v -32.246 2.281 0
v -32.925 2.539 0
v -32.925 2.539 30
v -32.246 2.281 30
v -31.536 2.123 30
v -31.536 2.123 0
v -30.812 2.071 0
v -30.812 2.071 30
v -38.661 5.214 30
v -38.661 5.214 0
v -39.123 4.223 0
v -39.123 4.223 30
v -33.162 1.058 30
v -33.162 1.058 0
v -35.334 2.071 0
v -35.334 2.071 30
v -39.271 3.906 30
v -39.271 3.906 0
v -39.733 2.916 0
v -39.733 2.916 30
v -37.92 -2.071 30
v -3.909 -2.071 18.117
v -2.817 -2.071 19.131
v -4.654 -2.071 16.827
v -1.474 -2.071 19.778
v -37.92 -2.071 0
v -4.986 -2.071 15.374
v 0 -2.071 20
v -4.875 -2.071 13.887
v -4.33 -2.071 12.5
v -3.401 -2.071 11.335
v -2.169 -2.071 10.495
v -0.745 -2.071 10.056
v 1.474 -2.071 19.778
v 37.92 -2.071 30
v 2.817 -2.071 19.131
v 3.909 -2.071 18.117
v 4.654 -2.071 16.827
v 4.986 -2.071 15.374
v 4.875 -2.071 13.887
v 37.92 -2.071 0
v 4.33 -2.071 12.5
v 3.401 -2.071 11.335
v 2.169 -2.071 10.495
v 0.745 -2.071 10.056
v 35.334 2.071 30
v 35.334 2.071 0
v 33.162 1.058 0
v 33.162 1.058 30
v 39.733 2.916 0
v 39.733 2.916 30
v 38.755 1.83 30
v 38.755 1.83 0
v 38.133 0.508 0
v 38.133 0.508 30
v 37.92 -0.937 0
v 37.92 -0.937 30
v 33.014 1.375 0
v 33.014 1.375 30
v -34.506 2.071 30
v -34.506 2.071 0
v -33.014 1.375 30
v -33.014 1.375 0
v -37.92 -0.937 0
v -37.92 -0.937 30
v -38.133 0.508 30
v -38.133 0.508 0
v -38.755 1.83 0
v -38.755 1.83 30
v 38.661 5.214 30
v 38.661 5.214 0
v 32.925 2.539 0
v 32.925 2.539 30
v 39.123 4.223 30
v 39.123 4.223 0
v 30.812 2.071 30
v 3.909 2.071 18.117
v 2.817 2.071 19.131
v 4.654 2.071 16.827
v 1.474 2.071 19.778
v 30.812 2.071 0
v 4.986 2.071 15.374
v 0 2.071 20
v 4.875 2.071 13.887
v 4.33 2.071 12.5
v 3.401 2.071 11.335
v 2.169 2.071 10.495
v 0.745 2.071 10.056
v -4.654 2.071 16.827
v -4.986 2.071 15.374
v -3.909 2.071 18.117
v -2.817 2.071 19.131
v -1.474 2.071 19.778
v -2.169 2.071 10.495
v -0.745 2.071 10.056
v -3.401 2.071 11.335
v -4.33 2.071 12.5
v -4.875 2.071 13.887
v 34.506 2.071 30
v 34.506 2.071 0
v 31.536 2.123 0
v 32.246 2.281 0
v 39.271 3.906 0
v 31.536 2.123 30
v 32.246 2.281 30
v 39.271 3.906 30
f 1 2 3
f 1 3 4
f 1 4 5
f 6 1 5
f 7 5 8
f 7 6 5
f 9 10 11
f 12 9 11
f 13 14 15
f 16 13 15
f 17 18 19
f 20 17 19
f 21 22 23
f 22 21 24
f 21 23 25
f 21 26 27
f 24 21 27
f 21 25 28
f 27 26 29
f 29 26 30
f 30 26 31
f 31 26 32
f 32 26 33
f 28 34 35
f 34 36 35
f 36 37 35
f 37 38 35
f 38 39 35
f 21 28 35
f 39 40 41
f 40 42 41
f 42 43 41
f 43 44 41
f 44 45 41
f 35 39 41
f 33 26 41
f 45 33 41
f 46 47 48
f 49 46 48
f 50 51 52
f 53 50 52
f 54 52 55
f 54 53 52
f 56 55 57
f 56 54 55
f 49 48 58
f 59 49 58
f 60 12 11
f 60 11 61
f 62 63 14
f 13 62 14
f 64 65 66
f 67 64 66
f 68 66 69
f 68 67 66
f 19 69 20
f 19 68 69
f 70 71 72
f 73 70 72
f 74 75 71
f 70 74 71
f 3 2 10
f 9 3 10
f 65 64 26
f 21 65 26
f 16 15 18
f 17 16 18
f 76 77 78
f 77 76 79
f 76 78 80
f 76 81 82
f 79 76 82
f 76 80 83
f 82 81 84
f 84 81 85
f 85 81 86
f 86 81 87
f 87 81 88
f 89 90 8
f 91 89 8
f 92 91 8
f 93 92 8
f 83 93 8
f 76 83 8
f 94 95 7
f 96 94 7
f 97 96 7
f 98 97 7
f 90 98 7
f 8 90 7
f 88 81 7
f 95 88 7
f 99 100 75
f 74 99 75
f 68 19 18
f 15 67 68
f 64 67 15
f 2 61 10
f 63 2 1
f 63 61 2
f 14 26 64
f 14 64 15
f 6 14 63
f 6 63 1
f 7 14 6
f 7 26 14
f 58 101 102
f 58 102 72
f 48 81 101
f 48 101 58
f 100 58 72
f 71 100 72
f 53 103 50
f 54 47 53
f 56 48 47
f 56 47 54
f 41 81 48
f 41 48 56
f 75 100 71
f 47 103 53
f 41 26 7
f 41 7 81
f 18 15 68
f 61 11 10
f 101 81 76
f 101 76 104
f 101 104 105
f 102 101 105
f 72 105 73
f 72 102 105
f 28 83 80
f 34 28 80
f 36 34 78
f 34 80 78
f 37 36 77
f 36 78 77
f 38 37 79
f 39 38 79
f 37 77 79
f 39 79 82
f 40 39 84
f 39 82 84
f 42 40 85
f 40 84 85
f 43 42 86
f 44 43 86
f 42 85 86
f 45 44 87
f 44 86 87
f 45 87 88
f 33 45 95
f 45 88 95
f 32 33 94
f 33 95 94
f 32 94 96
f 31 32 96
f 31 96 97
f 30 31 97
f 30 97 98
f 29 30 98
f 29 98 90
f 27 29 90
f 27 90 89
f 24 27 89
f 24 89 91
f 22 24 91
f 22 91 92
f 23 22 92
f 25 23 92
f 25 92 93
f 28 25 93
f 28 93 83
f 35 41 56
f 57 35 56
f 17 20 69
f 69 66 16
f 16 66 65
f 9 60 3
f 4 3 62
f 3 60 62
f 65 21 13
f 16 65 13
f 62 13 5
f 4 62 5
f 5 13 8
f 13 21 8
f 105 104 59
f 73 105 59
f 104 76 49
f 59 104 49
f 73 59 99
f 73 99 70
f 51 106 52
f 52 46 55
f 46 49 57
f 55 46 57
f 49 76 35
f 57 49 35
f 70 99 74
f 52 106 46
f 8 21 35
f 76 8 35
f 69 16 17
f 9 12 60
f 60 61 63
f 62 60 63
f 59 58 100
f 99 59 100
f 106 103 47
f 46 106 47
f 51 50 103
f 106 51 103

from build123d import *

# Parameters (mm, degrees)
BOSS_EXTRUDE1_DEPTH = 30
FILLET1_R           = 5
SKETCH2_R           = 5
CUT_EXTRUDE1_DEPTH  = 30


with BuildPart() as part:
    # Sketch1 → Boss-Extrude1 (new body)
    with BuildSketch(Plane.XY):
        Polygon((37.92, -2.070510622), (37.92, 2.070510622), (35.334085277, 2.070510622), (33.1622407, 1.057762863), (33.014324308, 1.374970589), (34.505914723, 2.070510622), (31.92, 2.070510622), (-31.92, 2.070510622), (-34.505914723, 2.070510622), (-33.014324308, 1.374970589), (-33.1622407, 1.057762863), (-35.334085277, 2.070510622), (-37.92, 2.070510622), (-37.92, -2.070510622), align=None)
        Polygon((-39.732615574, 2.915747145), (-37.92, 2.070510622), (-35.334085277, 2.070510622), (-39.270755184, 3.906209947), align=None)
        Polygon((-34.505914723, 2.070510622), (-31.92, 2.070510622), (-38.660978403, 5.213880475), (-39.122838793, 4.223417673), align=None)
        Polygon((31.92, 2.070510622), (34.505914723, 2.070510622), (39.122838793, 4.223417673), (38.660978403, 5.213880475), align=None)
        Polygon((35.334085277, 2.070510622), (37.92, 2.070510622), (39.732615574, 2.915747145), (39.270755184, 3.906209947), align=None)
    extrude(amount=BOSS_EXTRUDE1_DEPTH)

    # Fillet1
    # the kernel refuses this fillet: 5 mm, written as the material it adds along each edge
    with BuildSketch(Plane(origin=(37.92, 2.070510622, 0), x_dir=(0, -1, 0), z_dir=(0, 0, 1))) as fillet1_piece_1:
        with BuildLine():
            CenterArc((3.007110881, 5), FILLET1_R, 219.603933445, 50.396066555)
            Line((-0.845236523, 1.812615574), (-0.922283472, 1.748867886))
            ThreePointArc((-0.922283472, 1.748867886), (-0.51324904, 0.864045961), (-0.090630779, -0.042261826))
            Line((-0.090630779, -0.042261826), (0, -0.1))
            Line((0, -0.1), (3.007110881, -0.1))
            Line((3.007110881, -0.1), (3.007110881, 0))
        make_face()
    extrude(amount=30)
    with BuildSketch(Plane(origin=(-37.92, 2.070510622, 0), x_dir=(0, -1, 0), z_dir=(0, 0, 1))) as fillet1_piece_2:
        with BuildLine():
            CenterArc((3.007110881, -5), FILLET1_R, 90, 50.396066555)
            Line((-0.845236523, -1.812615574), (-0.922283472, -1.748867886))
            ThreePointArc((-0.922283472, -1.748867886), (-0.51324904, -0.864045961), (-0.090630779, 0.042261826))
            Line((-0.090630779, 0.042261826), (0, 0.1))
            Line((0, 0.1), (3.007110881, 0.1))
            Line((3.007110881, 0.1), (3.007110881, 0))
        make_face()
    extrude(amount=30)
    with BuildSketch(Plane(origin=(31.92, 2.070510622, 0), x_dir=(-1, 0, 0), z_dir=(0, 0, 1)), Plane(origin=(-31.92, 2.070510622, 0), x_dir=(-0.9063077870366495, 0.4226182617407004, 0), z_dir=(0, 0, 1))) as fillet1_piece_3:
        with BuildLine():
            CenterArc((FILLET1_R * 0.221694662643, -FILLET1_R), FILLET1_R, 90, 25)
            Line((-FILLET1_R * 0.200923599098, -FILLET1_R * 0.0936922129634), (-FILLET1_R * 0.209375964333, -FILLET1_R * 0.0755660572226))
            Line((-FILLET1_R * 0.209375964333, -FILLET1_R * 0.0755660572226), (-FILLET1_R * 0.00443389325286, FILLET1_R * 0.02))
            Line((-FILLET1_R * 0.00443389325286, FILLET1_R * 0.02), (FILLET1_R * 0.221694662643, FILLET1_R * 0.02))
            Line((FILLET1_R * 0.221694662643, FILLET1_R * 0.02), (FILLET1_R * 0.221694662643, 0))
        make_face()
    extrude(amount=30)

    # Sketch2 → Cut-Extrude1 (cut)
    with BuildSketch(Plane(origin=(0, 2.070510622, 0), x_dir=(1, 0, 0), z_dir=(0, 1, 0))):
        with Locations(Location((0, -15, 0), (0, 0, 270))):
            Circle(SKETCH2_R)
    extrude(amount=-CUT_EXTRUDE1_DEPTH, mode=Mode.SUBTRACT)


solid = part.part
